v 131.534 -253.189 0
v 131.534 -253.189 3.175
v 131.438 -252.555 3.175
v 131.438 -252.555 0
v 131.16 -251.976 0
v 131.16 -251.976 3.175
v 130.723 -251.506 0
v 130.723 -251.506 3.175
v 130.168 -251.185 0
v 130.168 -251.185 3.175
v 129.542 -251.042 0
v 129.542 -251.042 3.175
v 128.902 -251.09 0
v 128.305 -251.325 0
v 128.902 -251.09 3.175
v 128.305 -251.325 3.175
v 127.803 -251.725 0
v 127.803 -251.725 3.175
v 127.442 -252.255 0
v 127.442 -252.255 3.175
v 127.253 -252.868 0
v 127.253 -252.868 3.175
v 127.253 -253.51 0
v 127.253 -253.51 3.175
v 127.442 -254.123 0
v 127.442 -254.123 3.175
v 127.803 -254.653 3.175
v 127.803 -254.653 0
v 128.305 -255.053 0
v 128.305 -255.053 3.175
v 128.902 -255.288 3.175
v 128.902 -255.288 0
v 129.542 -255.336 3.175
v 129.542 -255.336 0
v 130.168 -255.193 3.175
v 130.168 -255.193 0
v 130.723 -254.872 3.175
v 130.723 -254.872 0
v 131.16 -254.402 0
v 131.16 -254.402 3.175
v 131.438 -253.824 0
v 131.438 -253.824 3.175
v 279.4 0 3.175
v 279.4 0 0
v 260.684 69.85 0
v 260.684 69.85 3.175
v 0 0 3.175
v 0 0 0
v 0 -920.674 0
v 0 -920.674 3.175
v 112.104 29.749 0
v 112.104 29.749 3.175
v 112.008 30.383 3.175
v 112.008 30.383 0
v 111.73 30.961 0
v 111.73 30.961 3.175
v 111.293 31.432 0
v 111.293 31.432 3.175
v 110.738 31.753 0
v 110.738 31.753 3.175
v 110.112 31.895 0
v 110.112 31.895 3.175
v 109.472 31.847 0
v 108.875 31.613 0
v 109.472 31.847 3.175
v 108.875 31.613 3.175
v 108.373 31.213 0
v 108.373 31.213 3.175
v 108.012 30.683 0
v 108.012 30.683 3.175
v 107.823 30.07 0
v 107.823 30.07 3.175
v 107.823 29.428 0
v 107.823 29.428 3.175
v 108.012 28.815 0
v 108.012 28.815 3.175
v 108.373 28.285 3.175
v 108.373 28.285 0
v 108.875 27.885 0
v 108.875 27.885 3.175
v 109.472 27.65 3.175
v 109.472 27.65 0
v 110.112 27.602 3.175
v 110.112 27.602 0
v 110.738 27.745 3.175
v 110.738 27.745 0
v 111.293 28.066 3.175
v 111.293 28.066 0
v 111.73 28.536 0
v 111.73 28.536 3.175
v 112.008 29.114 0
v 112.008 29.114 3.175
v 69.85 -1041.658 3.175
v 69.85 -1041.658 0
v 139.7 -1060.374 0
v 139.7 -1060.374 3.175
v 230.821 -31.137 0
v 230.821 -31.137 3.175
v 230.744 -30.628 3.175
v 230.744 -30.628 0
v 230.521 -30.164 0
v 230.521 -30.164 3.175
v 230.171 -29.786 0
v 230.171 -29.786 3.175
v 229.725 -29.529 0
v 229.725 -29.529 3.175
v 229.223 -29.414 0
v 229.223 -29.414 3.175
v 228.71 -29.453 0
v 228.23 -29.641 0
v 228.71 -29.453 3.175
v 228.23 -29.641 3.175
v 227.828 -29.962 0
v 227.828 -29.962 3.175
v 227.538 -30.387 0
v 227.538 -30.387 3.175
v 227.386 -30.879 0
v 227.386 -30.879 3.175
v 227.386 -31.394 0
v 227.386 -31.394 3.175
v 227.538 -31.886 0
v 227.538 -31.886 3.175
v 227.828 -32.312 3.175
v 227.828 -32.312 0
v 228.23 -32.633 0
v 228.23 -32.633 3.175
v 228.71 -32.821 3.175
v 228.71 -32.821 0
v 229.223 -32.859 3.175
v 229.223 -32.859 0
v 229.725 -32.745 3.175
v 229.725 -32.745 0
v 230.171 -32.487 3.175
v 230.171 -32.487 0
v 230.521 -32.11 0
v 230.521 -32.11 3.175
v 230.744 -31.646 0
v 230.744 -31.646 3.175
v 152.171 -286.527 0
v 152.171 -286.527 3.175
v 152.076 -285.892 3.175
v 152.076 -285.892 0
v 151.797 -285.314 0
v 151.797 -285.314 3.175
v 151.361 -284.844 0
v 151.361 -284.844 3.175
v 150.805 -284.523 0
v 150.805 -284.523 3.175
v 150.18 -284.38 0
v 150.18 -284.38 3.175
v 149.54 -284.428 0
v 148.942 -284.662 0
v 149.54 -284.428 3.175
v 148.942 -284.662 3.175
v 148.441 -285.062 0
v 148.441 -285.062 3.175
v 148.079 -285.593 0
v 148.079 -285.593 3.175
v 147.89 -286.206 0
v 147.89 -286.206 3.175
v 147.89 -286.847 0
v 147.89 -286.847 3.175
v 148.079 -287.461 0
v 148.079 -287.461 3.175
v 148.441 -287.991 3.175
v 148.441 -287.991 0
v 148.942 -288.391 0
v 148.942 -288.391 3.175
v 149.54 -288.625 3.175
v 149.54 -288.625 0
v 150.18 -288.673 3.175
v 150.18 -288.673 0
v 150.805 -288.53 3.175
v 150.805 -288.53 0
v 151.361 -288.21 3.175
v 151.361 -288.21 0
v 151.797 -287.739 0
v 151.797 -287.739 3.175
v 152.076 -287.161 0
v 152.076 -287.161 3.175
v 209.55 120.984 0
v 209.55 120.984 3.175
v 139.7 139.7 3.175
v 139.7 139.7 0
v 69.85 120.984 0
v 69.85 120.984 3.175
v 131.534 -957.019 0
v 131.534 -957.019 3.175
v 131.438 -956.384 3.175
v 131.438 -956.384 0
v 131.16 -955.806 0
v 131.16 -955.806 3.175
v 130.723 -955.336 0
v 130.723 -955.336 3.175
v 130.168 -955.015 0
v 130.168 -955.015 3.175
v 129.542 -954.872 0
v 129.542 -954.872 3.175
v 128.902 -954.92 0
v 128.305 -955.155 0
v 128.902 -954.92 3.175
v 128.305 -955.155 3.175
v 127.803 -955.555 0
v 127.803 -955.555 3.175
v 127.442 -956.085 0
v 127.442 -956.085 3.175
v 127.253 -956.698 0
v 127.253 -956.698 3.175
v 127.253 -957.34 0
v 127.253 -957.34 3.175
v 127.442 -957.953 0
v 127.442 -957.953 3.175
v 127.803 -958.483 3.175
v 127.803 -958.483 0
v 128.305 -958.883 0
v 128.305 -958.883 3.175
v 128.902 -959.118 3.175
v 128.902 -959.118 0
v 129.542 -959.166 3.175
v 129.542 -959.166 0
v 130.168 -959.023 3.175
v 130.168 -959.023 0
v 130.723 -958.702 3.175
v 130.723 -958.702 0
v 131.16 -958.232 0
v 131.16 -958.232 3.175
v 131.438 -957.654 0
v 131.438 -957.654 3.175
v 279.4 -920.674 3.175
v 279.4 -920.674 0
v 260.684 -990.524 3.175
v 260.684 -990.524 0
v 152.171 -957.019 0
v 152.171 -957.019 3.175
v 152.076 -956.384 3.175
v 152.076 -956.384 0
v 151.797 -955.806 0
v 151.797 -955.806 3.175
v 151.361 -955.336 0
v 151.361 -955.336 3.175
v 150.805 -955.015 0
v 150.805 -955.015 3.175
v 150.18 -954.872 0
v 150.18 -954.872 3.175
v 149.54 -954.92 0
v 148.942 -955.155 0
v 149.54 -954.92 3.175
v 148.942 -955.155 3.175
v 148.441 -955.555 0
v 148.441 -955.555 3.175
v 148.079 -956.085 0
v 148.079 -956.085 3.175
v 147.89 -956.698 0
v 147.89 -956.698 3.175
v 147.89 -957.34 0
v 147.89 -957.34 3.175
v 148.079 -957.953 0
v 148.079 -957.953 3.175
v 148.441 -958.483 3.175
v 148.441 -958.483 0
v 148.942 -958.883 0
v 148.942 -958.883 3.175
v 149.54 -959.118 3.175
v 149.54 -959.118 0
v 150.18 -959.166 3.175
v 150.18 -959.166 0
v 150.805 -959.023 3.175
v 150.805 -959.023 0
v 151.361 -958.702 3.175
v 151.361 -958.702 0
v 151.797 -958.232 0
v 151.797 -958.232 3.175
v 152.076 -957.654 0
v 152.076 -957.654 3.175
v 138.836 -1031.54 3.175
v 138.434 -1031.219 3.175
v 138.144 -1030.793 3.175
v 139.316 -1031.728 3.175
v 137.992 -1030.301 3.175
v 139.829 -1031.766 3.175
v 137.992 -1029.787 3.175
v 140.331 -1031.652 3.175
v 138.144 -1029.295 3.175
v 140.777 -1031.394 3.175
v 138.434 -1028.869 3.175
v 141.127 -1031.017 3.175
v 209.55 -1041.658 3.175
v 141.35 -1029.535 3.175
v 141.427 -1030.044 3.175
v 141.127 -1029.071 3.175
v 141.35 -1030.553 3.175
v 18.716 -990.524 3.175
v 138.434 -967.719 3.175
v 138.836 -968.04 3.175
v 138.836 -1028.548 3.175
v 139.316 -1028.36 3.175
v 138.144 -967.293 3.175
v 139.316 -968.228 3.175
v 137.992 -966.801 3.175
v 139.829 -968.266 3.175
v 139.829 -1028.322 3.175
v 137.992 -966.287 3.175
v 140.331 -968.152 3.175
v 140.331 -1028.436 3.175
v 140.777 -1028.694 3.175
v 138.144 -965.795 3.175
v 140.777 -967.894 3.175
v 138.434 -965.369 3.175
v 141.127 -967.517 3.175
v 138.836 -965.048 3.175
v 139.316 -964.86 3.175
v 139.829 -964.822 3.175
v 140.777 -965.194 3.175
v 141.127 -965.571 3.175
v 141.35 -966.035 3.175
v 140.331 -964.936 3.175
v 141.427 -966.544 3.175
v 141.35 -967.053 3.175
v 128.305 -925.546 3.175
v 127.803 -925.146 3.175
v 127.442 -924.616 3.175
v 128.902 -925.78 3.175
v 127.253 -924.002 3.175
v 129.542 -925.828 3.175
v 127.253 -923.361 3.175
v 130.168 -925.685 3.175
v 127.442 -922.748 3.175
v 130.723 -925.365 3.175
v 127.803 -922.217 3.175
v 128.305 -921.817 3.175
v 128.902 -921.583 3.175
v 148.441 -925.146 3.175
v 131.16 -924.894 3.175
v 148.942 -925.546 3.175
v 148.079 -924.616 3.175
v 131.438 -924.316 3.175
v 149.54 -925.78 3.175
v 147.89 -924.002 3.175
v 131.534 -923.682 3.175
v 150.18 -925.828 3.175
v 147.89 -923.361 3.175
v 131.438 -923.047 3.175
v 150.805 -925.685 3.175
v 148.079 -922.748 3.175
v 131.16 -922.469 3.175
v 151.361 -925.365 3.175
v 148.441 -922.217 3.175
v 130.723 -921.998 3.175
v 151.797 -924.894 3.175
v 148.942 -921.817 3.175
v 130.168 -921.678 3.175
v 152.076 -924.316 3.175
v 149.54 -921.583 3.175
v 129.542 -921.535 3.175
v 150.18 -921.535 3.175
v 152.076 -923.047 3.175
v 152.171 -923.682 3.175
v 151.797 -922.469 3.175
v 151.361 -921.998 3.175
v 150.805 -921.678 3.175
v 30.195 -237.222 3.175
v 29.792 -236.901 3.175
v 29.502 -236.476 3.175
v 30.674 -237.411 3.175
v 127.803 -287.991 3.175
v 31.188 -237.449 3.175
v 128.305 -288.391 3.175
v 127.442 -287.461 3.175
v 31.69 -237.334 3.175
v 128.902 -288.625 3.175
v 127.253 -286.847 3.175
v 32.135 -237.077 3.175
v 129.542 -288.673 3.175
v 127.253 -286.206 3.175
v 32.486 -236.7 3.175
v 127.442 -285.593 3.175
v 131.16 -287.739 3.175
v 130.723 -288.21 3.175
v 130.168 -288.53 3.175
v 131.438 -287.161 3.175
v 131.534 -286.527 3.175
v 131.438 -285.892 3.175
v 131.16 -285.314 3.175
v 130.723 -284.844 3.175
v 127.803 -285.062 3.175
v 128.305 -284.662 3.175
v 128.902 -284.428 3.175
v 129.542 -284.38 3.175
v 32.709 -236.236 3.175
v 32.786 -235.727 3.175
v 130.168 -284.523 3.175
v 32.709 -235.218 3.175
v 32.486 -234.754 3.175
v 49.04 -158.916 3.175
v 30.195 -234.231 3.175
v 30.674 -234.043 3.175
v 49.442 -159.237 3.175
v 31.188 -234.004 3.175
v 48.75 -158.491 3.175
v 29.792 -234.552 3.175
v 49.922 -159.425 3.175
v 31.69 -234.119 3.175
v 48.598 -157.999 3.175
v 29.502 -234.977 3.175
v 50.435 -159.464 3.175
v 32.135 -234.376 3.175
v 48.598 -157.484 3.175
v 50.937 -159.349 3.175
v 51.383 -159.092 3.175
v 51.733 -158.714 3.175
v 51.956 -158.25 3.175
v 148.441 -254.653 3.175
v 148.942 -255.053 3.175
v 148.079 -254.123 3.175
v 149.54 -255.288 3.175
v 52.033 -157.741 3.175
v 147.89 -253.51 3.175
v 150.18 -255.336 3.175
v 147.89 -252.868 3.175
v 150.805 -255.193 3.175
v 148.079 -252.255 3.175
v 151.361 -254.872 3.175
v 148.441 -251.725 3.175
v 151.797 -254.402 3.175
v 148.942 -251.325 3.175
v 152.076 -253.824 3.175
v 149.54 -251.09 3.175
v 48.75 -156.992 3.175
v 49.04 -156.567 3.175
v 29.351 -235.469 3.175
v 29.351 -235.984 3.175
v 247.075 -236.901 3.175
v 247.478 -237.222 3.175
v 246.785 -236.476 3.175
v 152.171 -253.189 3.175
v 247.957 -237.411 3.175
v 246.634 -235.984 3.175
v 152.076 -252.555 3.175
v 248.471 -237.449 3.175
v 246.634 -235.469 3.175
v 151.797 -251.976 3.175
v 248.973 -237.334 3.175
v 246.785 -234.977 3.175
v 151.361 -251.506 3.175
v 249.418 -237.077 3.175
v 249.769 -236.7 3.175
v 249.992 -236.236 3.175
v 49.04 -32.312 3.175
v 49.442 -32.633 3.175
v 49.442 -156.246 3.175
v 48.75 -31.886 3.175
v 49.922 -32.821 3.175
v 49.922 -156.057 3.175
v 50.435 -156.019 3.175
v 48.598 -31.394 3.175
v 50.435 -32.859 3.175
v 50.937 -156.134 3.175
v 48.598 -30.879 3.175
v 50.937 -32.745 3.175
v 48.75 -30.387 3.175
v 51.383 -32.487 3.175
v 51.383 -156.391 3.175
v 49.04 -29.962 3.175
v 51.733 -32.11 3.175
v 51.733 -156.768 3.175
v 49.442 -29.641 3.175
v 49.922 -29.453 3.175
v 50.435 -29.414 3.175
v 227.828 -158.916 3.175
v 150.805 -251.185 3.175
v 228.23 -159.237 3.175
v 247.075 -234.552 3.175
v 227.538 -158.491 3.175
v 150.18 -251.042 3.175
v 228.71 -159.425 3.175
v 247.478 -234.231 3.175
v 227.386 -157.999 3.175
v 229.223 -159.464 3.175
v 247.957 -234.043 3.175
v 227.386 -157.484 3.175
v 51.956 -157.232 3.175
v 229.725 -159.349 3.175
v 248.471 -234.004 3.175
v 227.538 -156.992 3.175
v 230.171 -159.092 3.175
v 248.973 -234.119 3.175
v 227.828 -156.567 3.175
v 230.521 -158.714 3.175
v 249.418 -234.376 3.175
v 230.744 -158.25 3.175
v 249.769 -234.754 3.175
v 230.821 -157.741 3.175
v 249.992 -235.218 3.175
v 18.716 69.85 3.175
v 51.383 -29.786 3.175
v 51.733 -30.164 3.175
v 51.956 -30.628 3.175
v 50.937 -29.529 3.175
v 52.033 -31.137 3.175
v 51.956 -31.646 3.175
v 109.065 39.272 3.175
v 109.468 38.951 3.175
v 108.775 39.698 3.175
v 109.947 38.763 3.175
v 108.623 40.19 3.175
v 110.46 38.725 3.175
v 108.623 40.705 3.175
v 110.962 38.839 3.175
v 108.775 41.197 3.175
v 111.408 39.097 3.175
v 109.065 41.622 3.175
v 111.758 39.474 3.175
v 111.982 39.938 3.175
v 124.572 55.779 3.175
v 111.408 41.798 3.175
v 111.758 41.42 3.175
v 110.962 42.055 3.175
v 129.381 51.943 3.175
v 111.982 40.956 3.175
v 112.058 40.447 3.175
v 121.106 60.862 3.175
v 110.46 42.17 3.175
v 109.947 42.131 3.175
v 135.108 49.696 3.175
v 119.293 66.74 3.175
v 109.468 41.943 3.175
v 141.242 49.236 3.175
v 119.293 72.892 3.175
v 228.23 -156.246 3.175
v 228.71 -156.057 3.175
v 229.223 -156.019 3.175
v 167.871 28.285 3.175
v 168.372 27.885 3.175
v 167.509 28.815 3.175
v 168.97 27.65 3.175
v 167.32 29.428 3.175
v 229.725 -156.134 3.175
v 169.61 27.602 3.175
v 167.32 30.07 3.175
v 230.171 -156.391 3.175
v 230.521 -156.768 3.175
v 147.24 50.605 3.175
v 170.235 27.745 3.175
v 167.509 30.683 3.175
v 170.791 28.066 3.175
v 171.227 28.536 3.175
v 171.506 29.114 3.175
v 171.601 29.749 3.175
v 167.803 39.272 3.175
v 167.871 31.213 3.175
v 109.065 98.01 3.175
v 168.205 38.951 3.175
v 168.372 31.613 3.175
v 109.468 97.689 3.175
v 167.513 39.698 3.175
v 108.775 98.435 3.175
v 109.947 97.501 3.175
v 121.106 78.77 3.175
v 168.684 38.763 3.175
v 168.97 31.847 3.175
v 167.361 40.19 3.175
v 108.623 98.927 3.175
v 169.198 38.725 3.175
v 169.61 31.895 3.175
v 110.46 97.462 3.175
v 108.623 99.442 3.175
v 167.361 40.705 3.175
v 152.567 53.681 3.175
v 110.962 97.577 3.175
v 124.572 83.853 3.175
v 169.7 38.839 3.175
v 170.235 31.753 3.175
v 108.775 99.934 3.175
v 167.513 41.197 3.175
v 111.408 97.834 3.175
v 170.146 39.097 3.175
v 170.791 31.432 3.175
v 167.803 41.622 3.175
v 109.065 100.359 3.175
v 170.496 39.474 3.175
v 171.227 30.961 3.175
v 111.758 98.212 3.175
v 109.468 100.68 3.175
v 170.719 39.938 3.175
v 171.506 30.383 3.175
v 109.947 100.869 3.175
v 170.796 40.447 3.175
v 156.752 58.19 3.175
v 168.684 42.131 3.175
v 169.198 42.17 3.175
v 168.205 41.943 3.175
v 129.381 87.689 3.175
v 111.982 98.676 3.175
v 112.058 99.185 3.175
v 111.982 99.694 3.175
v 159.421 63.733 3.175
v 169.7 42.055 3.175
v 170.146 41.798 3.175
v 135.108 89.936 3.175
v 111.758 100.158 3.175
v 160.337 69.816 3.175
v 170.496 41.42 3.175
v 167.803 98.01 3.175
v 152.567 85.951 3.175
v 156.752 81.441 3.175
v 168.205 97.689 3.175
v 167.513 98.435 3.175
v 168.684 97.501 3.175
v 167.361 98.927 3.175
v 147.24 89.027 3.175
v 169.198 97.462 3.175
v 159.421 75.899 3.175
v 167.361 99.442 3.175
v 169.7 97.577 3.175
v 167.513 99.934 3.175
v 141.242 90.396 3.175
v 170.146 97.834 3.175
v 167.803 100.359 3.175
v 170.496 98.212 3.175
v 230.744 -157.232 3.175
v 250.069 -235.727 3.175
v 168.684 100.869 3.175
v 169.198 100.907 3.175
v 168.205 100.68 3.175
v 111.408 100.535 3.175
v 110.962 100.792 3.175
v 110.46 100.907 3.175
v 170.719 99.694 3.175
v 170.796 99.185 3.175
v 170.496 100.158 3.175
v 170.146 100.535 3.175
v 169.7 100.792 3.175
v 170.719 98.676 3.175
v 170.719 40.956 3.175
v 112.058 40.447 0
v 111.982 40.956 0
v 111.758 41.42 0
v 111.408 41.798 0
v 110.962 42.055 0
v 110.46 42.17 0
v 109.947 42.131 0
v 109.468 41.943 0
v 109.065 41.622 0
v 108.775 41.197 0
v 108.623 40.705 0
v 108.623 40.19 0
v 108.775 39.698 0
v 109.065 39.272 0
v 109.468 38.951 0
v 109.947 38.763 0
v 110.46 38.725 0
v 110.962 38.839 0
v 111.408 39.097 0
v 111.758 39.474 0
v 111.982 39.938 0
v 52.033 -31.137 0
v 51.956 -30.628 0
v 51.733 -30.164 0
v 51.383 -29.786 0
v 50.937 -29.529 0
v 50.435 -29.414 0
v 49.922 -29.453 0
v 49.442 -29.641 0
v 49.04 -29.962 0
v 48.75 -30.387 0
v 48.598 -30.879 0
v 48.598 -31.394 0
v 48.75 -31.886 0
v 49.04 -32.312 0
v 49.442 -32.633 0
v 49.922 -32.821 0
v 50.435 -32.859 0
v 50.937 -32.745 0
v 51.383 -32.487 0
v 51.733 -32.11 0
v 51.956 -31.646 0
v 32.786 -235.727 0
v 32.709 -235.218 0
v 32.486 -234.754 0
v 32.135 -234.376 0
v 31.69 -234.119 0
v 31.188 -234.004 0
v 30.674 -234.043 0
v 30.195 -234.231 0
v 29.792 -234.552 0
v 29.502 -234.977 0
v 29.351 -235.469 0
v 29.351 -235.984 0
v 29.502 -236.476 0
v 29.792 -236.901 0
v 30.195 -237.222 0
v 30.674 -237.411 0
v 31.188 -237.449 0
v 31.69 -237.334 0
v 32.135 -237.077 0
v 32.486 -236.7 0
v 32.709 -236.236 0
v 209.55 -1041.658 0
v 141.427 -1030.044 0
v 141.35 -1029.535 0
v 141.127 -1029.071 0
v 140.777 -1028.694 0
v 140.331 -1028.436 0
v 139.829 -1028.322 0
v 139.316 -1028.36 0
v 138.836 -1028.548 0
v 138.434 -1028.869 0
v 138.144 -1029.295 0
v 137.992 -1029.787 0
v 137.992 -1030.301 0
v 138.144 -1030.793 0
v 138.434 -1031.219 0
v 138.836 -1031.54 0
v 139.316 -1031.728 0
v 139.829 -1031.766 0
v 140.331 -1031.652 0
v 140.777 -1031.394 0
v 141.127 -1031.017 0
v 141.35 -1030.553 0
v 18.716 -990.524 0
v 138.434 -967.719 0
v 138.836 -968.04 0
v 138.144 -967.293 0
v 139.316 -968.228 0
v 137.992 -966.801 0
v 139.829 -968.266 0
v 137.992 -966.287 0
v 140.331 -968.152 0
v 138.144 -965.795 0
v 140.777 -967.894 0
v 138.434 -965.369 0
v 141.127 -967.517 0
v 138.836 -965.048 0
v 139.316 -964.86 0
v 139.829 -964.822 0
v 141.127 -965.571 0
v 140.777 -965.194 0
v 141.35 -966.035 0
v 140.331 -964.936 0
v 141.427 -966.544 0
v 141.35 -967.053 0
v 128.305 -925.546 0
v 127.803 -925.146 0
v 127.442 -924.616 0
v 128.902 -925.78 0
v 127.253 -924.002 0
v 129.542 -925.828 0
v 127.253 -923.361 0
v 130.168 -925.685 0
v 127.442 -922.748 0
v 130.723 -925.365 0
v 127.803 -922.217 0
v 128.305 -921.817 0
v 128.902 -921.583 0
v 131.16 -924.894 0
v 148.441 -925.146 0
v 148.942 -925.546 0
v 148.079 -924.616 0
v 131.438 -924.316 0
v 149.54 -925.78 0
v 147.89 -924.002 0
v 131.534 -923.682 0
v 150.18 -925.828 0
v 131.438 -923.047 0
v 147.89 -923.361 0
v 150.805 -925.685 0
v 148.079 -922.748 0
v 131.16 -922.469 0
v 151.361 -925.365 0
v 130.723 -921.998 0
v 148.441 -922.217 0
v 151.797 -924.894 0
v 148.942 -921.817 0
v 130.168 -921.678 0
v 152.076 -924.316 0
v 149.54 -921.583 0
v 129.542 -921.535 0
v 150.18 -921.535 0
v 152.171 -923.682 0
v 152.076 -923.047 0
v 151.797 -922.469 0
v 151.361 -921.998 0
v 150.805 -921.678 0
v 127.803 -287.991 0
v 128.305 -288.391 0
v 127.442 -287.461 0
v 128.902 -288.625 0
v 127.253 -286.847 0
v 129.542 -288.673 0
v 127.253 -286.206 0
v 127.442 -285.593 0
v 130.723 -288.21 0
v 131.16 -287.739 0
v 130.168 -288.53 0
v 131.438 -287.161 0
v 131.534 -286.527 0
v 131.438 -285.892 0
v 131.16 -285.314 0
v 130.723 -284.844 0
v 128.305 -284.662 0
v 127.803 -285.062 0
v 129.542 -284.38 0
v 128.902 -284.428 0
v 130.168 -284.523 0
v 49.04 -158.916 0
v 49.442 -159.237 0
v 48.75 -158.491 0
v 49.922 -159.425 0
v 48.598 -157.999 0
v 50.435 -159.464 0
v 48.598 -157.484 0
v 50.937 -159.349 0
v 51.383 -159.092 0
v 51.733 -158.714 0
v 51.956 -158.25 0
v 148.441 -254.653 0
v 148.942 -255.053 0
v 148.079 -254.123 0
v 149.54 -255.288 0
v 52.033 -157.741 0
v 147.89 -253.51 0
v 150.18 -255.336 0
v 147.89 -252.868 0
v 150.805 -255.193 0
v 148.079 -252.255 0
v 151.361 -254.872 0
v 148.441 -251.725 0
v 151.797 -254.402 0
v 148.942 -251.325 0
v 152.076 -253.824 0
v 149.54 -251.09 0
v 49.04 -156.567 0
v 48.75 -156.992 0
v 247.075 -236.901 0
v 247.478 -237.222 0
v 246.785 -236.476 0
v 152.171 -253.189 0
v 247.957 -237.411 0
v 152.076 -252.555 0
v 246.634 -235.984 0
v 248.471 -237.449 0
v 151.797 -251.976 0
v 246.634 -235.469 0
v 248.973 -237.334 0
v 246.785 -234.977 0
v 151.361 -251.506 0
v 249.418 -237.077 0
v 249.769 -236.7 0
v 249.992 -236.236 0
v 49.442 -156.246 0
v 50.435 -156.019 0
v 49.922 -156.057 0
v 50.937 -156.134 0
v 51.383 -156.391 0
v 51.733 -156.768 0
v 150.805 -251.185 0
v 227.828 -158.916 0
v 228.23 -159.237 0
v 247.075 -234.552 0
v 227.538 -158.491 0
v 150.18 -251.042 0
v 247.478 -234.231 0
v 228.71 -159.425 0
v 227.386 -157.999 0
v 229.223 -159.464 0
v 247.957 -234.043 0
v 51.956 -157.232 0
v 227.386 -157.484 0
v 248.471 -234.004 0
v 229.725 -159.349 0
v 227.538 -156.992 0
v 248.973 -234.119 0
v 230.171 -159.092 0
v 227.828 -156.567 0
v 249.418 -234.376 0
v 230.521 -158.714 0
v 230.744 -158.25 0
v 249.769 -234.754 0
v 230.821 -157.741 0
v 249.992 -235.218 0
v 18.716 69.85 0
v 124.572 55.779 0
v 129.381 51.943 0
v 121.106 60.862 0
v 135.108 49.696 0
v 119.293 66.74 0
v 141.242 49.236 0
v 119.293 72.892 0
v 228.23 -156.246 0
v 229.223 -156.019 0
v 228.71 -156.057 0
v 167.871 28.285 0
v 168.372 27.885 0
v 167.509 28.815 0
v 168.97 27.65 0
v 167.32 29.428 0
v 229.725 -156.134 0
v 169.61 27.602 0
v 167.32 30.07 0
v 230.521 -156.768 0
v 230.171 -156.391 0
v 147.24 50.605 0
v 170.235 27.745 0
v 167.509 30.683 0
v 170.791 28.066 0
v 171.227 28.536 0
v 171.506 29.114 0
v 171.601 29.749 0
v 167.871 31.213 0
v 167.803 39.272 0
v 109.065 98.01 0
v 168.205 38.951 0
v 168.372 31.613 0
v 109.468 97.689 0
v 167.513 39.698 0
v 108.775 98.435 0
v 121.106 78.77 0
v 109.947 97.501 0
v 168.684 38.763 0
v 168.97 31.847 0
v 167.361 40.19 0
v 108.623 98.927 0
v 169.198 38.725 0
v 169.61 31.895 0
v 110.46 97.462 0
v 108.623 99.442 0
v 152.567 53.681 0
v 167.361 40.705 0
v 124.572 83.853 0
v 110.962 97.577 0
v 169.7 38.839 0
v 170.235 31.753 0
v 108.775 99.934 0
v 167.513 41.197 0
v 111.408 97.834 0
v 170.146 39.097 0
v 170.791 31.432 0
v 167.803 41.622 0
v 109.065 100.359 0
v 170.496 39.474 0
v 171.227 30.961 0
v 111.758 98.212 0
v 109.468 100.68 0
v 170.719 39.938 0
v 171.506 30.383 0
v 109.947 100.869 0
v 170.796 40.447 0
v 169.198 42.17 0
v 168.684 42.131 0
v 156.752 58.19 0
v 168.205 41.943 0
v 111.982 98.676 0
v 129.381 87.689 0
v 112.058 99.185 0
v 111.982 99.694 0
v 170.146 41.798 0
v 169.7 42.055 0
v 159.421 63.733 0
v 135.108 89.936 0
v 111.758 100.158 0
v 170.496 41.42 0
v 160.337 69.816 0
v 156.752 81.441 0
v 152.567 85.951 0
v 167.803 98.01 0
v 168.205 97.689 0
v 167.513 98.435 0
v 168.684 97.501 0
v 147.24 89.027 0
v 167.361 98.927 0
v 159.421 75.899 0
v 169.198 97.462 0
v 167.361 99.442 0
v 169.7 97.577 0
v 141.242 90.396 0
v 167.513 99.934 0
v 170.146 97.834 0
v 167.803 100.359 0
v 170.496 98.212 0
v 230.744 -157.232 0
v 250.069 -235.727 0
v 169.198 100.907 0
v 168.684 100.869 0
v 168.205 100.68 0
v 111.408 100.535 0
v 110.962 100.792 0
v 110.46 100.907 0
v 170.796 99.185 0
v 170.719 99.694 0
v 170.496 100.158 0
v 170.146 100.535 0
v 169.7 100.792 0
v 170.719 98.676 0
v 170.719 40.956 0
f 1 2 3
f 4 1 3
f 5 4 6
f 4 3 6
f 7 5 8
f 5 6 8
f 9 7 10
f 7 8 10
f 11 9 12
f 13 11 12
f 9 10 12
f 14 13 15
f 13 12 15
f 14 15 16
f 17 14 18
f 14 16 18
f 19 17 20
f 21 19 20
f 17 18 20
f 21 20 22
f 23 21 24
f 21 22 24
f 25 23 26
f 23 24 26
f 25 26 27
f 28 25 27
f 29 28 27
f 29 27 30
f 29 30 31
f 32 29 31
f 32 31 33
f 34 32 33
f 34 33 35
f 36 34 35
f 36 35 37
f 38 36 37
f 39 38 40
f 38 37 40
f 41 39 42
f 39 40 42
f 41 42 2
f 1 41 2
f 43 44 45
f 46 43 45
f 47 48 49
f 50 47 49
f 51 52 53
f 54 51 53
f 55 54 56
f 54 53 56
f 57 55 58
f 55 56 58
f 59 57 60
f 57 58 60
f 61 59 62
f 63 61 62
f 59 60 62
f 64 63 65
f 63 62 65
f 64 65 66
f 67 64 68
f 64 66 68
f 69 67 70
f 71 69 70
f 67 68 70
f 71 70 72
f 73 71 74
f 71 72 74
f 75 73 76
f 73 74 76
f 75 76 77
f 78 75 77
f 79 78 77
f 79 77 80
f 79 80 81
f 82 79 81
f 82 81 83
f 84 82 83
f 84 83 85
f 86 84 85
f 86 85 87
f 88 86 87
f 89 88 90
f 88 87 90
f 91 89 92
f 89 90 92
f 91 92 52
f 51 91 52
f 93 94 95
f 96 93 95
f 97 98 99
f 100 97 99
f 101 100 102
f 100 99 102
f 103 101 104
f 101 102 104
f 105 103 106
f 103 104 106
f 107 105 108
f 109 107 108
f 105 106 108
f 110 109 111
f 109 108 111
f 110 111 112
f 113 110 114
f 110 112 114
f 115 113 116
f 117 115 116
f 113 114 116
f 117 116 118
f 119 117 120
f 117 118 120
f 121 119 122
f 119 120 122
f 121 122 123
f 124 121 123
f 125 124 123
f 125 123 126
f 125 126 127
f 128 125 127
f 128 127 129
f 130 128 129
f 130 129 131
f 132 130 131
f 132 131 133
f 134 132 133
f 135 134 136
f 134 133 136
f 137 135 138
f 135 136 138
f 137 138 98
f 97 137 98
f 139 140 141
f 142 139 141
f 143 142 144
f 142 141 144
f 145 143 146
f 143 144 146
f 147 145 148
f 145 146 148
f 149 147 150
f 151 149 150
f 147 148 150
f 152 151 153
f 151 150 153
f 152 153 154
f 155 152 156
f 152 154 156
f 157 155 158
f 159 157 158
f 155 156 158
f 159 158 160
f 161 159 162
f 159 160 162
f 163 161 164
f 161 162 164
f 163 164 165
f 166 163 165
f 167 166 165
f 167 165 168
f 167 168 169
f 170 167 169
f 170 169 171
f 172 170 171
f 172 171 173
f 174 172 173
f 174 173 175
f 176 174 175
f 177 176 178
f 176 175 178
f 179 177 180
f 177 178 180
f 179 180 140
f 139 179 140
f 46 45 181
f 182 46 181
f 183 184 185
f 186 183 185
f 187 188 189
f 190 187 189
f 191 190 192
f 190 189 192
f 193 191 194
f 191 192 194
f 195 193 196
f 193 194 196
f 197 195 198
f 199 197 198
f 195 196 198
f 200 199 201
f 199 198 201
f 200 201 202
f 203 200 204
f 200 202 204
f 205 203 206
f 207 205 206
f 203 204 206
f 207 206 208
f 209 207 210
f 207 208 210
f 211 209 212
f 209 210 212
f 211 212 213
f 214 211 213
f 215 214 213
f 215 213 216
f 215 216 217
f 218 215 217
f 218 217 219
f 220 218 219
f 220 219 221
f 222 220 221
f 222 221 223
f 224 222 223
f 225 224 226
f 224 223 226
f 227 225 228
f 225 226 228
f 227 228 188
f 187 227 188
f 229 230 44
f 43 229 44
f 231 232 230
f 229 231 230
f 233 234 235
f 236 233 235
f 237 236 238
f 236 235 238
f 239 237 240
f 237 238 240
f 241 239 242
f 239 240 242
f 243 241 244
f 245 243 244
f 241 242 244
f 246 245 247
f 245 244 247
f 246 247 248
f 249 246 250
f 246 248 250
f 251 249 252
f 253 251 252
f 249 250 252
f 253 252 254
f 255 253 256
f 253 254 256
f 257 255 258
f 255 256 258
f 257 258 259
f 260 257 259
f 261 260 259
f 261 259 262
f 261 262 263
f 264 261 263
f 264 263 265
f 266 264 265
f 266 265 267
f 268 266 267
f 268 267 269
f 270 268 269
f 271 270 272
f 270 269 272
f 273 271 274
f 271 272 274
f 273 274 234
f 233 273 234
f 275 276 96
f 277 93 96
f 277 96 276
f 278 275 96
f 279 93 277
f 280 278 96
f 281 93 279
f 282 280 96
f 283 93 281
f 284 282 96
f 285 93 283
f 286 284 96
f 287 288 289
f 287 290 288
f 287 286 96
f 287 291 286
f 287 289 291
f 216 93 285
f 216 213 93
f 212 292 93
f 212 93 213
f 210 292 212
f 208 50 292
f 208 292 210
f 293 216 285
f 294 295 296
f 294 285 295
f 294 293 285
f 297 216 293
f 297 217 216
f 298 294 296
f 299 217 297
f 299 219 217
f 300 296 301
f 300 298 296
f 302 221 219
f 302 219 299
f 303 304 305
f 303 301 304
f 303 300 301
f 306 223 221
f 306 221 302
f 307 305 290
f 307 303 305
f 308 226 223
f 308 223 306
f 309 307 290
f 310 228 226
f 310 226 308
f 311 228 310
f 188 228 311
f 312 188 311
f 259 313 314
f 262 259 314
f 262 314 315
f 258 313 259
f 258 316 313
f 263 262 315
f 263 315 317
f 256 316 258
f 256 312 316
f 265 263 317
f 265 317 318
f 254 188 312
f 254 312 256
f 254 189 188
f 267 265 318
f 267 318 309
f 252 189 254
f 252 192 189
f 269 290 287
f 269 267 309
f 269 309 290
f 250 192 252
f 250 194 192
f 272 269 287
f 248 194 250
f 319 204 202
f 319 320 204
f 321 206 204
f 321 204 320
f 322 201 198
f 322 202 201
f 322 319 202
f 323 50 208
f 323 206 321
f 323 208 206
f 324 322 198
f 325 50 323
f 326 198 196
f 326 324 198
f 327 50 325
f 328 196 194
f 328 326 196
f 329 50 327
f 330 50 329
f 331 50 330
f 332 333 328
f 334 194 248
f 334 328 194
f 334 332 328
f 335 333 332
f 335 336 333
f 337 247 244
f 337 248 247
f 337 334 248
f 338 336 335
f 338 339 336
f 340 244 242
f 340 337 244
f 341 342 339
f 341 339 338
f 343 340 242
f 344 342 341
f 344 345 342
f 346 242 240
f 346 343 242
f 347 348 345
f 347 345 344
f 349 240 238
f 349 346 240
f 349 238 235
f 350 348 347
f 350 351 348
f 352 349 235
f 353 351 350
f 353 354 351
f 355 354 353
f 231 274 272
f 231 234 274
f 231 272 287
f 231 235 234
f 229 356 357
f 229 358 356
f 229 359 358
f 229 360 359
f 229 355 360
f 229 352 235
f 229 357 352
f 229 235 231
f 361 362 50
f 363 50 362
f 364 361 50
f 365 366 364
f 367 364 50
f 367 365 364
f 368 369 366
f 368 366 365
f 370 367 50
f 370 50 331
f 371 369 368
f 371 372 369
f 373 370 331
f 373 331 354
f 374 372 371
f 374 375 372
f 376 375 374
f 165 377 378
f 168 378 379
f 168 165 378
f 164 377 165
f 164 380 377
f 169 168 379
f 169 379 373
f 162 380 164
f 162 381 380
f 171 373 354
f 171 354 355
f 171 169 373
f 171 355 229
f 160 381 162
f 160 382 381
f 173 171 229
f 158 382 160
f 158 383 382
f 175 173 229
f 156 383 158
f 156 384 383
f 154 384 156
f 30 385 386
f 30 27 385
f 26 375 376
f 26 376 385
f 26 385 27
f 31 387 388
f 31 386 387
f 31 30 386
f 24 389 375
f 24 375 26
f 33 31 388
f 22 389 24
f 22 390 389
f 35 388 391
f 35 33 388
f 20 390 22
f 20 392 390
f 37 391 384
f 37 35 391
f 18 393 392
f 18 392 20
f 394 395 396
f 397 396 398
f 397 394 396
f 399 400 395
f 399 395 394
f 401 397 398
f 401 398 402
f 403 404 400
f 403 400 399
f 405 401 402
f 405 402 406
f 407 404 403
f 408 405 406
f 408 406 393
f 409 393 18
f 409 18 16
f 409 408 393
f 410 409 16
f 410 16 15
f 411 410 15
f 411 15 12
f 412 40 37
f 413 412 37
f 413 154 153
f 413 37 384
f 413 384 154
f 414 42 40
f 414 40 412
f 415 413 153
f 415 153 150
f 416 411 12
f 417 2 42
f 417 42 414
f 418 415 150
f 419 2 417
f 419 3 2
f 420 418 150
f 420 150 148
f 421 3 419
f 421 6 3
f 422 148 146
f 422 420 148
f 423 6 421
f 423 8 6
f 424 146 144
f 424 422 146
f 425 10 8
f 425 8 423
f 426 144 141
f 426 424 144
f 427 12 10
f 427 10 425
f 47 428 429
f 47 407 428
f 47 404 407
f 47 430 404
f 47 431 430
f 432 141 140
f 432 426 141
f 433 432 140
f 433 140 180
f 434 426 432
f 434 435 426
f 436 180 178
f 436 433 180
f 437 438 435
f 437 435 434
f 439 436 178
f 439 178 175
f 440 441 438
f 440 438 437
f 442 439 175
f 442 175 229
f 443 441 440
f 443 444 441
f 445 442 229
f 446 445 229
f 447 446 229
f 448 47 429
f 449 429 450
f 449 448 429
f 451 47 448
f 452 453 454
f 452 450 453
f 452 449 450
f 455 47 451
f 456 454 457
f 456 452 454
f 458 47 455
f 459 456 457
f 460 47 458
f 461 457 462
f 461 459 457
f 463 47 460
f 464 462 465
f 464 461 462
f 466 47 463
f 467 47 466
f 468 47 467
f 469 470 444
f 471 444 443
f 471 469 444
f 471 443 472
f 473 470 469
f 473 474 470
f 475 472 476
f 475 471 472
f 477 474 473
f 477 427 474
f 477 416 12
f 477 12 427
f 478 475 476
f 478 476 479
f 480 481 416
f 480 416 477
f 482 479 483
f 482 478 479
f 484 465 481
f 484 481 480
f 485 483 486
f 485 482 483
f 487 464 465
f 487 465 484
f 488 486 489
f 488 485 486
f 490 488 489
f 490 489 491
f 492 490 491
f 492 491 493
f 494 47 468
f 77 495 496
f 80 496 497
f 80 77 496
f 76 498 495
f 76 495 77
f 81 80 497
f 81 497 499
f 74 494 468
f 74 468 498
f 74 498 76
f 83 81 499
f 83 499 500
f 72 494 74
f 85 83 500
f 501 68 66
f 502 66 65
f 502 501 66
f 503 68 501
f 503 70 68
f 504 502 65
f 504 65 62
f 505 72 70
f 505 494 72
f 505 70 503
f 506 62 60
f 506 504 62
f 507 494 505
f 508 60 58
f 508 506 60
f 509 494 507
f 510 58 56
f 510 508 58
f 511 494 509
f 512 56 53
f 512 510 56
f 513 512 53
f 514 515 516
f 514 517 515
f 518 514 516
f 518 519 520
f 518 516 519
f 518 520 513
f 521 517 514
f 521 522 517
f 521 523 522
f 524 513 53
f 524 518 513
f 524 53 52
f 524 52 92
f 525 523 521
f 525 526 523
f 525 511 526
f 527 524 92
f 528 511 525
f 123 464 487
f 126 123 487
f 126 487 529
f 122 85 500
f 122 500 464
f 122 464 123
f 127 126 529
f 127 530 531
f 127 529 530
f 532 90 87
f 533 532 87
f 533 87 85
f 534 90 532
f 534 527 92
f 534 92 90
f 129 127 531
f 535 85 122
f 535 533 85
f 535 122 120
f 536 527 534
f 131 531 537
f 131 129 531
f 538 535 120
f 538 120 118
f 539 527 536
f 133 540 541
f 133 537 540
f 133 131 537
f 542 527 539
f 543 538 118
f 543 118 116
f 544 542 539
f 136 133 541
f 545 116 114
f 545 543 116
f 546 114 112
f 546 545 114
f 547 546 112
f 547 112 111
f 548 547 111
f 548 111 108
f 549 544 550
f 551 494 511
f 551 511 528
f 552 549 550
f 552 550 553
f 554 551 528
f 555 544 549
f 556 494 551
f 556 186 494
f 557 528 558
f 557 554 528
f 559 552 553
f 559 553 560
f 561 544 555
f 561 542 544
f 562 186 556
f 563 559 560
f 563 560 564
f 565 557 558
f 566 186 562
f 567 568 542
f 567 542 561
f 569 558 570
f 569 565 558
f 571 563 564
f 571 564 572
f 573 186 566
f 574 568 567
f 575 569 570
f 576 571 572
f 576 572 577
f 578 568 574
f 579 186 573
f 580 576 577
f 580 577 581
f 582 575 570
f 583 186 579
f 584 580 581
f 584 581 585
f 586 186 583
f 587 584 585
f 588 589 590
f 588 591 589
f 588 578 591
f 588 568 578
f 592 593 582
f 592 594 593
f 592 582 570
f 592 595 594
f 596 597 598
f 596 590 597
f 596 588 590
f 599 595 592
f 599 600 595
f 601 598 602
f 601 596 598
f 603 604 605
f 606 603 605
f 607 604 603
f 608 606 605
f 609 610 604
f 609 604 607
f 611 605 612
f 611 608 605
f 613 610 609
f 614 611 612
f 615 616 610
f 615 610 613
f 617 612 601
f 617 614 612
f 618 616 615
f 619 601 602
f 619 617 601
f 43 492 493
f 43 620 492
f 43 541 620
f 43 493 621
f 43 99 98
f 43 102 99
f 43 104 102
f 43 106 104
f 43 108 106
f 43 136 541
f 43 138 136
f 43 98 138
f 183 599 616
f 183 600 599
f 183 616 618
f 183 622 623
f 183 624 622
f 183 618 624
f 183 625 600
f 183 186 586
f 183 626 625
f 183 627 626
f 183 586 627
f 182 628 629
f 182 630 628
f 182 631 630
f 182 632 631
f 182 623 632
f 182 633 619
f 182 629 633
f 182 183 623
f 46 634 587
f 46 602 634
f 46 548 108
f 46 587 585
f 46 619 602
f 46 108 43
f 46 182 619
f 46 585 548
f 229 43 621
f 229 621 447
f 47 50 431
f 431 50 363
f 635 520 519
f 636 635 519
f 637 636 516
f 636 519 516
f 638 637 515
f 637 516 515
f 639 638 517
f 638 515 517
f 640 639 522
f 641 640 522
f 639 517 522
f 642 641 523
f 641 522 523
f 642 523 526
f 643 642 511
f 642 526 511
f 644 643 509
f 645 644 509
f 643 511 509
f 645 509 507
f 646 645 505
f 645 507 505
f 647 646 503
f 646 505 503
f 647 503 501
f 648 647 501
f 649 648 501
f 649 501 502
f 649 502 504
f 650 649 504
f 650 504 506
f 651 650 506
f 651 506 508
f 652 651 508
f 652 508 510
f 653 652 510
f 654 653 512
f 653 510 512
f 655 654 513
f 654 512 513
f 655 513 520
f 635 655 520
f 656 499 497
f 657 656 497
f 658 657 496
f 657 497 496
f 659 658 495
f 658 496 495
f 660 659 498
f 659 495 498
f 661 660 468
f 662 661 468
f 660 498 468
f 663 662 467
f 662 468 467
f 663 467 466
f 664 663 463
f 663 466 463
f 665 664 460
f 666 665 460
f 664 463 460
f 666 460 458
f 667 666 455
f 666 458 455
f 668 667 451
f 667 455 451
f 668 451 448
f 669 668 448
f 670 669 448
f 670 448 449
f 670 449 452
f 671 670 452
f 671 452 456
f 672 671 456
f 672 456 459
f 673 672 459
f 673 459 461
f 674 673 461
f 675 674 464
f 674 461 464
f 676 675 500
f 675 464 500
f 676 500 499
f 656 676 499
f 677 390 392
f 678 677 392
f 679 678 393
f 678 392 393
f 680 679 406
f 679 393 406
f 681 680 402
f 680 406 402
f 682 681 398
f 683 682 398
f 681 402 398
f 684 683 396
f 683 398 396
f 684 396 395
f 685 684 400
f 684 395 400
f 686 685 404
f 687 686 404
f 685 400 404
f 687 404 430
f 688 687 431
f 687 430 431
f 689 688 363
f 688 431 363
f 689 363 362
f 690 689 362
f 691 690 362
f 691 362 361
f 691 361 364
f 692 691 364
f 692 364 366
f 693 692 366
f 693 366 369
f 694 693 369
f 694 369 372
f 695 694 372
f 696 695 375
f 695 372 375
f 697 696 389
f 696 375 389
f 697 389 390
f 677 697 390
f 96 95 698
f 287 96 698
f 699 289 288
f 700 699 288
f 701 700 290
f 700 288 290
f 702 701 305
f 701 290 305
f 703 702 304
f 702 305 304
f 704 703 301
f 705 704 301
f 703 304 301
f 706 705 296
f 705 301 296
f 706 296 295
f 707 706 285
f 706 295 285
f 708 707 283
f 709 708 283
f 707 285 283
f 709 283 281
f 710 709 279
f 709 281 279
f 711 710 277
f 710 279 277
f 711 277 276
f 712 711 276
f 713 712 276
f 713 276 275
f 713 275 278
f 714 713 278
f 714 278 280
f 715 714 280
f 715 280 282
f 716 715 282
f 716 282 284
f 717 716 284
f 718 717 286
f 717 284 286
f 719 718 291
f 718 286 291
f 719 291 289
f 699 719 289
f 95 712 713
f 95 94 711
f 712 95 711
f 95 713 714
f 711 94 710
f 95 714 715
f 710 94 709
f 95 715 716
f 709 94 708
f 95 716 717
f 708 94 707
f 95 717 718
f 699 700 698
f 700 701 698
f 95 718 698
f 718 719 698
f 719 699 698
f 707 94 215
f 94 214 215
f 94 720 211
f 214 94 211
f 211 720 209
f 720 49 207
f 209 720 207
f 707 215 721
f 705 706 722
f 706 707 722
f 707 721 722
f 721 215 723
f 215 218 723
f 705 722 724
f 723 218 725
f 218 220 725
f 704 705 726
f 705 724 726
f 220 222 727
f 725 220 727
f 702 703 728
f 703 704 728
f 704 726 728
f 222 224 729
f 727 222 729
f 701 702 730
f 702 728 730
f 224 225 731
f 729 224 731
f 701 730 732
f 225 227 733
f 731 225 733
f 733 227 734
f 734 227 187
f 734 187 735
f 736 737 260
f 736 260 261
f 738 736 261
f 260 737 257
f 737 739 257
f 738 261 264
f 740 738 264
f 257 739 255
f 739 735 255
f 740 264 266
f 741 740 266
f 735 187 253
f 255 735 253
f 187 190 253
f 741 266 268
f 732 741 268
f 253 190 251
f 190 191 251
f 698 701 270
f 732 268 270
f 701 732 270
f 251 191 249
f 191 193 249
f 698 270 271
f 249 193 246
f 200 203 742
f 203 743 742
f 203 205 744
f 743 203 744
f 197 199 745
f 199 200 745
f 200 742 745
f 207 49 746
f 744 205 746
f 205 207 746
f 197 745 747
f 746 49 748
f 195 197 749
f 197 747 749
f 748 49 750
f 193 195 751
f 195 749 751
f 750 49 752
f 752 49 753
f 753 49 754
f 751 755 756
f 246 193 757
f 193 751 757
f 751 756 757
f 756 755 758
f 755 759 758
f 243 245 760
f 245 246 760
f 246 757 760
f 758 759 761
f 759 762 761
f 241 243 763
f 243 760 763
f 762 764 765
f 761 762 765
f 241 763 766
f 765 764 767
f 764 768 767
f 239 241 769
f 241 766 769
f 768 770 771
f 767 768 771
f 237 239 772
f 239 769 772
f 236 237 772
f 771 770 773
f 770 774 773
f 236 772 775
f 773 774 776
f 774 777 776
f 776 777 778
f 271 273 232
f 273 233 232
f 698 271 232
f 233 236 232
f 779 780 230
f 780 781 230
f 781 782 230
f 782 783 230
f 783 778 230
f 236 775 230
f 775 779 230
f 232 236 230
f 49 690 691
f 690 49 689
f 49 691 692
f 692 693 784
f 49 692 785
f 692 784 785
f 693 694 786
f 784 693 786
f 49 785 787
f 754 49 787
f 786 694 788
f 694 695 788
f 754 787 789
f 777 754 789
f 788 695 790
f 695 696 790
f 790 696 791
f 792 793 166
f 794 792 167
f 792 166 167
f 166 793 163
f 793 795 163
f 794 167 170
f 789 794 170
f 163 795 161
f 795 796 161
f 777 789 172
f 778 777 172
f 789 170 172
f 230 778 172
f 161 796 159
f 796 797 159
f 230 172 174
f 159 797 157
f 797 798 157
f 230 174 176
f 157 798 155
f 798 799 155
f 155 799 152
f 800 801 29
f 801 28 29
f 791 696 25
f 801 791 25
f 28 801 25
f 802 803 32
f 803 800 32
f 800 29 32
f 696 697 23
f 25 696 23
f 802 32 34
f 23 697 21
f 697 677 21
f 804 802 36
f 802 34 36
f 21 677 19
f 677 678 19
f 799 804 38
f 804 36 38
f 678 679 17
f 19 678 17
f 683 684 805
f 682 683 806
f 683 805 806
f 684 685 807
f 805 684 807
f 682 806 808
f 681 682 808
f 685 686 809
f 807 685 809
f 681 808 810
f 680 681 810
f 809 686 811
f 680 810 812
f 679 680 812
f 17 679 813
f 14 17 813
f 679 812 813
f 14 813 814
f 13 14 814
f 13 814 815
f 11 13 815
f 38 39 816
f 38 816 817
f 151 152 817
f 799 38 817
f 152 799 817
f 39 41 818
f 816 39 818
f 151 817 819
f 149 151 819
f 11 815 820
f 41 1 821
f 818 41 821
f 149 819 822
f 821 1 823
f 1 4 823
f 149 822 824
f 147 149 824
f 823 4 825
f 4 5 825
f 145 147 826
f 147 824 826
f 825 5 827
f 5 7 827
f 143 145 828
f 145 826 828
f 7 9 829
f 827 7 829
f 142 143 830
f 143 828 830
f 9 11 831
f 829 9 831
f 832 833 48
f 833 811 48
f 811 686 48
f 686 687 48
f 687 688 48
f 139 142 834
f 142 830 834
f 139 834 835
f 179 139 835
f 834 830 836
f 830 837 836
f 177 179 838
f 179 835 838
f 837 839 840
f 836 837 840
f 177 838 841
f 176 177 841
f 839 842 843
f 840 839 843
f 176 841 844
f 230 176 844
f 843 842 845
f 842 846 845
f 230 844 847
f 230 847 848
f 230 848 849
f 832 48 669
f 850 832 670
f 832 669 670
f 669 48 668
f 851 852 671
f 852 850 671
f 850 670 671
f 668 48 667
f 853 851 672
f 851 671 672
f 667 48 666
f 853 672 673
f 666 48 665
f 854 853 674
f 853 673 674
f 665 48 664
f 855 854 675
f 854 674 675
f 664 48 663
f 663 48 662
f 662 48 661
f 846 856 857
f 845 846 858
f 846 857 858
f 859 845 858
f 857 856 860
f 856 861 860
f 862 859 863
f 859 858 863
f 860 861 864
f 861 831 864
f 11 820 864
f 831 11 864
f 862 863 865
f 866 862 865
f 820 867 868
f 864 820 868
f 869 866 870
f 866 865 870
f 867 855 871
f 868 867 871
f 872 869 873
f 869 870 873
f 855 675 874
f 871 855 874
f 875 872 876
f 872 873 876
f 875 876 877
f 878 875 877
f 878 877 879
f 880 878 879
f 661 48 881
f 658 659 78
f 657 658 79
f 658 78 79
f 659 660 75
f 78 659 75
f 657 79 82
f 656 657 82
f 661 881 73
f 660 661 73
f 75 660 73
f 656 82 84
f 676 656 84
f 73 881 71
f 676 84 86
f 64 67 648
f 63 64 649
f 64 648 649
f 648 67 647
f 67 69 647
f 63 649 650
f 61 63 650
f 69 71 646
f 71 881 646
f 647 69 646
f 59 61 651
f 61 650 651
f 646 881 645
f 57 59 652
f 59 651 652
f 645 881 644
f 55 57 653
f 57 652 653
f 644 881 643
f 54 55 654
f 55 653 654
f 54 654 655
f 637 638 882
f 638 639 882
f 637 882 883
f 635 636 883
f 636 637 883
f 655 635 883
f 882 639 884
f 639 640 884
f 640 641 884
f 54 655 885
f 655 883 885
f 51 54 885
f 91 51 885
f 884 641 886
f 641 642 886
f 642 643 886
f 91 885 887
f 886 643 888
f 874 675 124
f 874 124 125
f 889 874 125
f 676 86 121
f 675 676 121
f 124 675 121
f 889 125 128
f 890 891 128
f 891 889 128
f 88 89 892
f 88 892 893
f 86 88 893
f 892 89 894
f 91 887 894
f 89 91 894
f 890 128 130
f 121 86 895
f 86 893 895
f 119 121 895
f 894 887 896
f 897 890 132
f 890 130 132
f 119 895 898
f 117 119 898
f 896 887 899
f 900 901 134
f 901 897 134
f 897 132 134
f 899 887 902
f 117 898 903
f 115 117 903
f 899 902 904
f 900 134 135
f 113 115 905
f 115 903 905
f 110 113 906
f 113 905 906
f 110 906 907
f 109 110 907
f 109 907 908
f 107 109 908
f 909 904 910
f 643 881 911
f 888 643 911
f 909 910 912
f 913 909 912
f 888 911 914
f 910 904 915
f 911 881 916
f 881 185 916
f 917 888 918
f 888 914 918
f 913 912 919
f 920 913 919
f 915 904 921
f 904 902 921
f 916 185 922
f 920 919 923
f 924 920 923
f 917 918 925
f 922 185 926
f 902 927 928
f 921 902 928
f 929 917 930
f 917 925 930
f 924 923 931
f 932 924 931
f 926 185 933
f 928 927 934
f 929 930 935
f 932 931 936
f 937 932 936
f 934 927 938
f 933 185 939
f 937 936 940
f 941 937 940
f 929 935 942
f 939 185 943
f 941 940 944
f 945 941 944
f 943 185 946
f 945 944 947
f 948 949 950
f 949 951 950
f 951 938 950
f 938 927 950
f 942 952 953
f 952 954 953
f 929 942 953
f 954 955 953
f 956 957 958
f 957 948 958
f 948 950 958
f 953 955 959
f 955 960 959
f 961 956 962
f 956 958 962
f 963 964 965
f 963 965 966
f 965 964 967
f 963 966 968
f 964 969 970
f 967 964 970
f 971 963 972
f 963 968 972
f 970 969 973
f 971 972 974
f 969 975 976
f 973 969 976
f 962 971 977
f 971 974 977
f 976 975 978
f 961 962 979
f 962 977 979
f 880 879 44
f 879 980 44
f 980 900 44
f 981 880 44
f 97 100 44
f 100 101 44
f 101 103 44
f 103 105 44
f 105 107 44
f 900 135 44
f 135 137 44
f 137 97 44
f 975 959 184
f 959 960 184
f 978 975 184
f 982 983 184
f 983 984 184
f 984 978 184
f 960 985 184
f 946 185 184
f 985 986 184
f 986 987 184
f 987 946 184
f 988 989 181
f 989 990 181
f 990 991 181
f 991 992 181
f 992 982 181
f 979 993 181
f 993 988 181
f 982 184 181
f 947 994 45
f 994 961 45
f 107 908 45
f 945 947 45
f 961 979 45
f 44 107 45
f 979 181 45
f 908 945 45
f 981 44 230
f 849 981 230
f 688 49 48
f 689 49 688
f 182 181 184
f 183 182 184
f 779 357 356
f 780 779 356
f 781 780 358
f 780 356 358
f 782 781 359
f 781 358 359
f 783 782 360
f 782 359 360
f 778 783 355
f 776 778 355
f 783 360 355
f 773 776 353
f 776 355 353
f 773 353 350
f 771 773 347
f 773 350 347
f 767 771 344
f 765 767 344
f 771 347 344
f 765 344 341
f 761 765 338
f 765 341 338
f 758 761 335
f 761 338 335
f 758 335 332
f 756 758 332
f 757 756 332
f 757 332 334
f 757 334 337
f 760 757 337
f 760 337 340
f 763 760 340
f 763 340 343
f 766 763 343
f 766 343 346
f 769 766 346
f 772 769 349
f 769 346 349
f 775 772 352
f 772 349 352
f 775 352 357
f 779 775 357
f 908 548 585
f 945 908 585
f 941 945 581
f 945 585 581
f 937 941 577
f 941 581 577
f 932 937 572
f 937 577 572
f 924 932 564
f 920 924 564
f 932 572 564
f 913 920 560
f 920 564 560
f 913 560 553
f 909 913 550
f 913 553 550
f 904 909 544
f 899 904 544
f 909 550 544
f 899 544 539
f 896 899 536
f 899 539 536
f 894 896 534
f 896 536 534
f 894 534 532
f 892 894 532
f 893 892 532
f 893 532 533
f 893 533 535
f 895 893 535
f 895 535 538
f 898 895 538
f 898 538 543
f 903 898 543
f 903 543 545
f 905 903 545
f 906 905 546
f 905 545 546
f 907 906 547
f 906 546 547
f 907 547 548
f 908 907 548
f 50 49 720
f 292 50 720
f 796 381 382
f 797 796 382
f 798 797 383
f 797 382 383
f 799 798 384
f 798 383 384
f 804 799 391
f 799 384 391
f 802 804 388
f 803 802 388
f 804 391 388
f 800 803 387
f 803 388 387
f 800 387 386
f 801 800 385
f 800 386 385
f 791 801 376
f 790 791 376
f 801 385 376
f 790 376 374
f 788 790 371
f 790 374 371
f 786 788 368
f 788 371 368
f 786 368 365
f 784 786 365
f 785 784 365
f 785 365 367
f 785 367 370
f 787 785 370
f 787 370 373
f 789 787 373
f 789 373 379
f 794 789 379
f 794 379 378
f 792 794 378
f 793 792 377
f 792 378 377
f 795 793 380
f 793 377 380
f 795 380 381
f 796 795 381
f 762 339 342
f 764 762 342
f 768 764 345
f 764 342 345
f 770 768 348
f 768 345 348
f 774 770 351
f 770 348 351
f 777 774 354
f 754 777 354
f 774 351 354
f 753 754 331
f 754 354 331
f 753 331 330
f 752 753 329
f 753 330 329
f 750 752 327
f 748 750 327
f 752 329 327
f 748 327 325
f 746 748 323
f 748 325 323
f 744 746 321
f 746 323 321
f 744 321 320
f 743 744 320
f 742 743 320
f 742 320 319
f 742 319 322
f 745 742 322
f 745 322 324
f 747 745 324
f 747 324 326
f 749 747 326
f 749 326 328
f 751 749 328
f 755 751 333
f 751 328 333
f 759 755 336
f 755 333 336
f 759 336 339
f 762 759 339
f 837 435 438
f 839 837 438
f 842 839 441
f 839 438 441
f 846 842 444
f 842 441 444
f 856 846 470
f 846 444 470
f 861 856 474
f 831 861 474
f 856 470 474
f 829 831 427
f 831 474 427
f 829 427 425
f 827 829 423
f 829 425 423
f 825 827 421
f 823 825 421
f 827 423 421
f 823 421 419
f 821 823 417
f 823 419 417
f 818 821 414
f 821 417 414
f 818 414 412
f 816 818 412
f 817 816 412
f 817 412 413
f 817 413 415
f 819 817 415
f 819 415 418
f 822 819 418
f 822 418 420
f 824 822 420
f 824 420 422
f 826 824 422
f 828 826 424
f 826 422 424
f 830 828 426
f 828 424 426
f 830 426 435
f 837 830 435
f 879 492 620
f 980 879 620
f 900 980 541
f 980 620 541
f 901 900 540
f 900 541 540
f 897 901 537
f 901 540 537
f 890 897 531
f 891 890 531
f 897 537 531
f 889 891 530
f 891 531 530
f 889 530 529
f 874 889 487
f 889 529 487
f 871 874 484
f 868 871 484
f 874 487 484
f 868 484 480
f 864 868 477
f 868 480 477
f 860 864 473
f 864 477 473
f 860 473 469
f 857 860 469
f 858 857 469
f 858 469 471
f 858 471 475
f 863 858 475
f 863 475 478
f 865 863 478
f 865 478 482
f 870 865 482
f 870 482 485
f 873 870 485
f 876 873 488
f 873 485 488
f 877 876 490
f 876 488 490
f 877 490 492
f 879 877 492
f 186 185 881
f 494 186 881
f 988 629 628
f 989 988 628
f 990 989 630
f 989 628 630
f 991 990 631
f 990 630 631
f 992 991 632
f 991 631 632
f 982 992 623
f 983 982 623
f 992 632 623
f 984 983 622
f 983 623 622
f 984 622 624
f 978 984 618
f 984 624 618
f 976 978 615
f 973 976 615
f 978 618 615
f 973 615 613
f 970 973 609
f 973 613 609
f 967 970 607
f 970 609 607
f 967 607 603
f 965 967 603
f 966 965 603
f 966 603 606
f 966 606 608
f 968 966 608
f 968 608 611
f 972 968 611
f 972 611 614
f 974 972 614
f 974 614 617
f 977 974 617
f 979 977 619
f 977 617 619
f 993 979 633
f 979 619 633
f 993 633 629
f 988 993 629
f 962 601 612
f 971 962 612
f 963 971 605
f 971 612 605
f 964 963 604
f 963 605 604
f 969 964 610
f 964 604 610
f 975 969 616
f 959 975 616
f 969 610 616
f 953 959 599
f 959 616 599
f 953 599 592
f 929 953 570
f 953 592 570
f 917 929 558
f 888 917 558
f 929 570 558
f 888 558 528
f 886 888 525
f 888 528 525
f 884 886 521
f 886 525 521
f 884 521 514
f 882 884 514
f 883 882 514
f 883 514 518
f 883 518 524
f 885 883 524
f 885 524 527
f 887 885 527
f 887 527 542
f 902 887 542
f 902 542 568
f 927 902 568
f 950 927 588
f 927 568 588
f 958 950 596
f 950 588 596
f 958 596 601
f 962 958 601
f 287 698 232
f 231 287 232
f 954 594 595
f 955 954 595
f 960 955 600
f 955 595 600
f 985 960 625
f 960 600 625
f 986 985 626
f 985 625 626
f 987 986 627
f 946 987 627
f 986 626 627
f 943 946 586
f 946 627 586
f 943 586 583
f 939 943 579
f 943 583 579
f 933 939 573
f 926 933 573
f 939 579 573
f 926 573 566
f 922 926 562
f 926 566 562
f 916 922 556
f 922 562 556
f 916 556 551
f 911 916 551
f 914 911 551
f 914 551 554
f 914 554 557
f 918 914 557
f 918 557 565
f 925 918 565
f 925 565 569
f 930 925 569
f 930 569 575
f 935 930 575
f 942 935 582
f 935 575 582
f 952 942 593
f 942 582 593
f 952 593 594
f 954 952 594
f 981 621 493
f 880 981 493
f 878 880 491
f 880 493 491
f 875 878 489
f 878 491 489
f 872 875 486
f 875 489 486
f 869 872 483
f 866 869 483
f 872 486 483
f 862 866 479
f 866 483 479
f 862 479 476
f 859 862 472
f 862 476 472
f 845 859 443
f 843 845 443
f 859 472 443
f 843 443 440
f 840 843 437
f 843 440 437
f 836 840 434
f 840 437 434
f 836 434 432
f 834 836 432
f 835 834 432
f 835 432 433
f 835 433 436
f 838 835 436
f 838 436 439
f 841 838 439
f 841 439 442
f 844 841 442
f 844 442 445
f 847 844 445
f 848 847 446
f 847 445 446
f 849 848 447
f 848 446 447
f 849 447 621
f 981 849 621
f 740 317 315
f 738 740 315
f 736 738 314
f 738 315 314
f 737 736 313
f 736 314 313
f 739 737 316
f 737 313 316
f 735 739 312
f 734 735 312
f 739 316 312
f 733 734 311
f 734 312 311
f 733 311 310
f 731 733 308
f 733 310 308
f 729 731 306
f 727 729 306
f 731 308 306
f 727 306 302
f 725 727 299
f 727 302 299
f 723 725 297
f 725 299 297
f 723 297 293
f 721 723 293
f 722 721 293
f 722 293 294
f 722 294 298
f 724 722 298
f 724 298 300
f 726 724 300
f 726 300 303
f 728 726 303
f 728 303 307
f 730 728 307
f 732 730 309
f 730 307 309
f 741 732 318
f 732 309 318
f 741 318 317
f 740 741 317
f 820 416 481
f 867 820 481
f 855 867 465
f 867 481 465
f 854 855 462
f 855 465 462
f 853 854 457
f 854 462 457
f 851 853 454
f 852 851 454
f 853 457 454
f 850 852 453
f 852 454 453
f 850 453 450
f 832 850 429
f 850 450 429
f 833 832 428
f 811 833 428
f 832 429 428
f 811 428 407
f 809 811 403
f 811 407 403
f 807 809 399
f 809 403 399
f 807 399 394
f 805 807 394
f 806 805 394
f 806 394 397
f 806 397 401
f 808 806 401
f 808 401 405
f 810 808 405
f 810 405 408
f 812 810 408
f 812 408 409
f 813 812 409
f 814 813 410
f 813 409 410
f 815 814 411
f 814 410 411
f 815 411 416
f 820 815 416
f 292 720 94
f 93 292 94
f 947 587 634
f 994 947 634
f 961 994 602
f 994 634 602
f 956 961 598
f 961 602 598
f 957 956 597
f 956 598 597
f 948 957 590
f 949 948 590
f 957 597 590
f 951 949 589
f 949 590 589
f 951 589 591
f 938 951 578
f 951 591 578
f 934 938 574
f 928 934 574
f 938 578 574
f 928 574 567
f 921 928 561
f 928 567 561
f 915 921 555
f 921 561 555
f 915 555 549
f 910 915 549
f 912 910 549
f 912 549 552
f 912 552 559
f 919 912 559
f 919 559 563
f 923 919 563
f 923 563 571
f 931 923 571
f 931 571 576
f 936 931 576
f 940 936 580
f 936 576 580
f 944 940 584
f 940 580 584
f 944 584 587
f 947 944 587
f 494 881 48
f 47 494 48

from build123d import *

# Parameters (mm, degrees)
F1_DEPTH = 3.175
F2_R     = 20.6375
F2_R_2   = 1.7272
F2_R_3   = 2.15265
F3_DEPTH = 3.175
F4_R     = 2.15265
F5_DEPTH = 3.175


with BuildPart() as f1:
    # F0 (on Top) → F1 (new body)
    with BuildSketch(Plane.XY):
        Polygon((279.4, -920.674486), (279.4, 0), (260.683749, 69.85), (209.55, 120.983749), (139.7, 139.7), (69.85, 120.983749), (18.716251, 69.85), (0, 0), (0, -920.674486), (18.716251, -990.524486), (69.85, -1041.658235), (139.7, -1060.374486), (209.55, -1041.658235), (260.683749, -990.524486), align=None)
    extrude(amount=F1_DEPTH)

    # F2 (on face) → F3 (cut, through all)
    with BuildSketch(Plane.XY.offset(3.175)):
        with Locations((139.7, 69.815902)):
            Circle(F2_R)
        with Locations((229.093993, -31.136842)):
            Circle(F2_R_2)
        with Locations((229.093993, -157.74139)):
            Circle(F2_R_2)
        with Locations((110.33125, 40.447152)):
            Circle(F2_R_2)
        with Locations((169.06875, 40.447152)):
            Circle(F2_R_2)
        with Locations((169.06875, 99.184652)):
            Circle(F2_R_2)
        with Locations((110.33125, 99.184652)):
            Circle(F2_R_2)
        with Locations((50.306007, -157.74139)):
            Circle(F2_R_2)
        with Locations((50.306007, -31.136842)):
            Circle(F2_R_2)
        with Locations((248.34149, -235.726616)):
            Circle(F2_R_2)
        with Locations((31.05851, -235.726616)):
            Circle(F2_R_2)
        with Locations((150.01875, -286.526616)):
            Circle(F2_R_3)
        with Locations((129.38125, -286.526616)):
            Circle(F2_R_3)
        with Locations((129.38125, -253.189116)):
            Circle(F2_R_3)
        with Locations((150.01875, -253.189116)):
            Circle(F2_R_3)
        with Locations((129.38125, -923.681501)):
            Circle(F2_R_3)
        with Locations((150.01875, -923.681501)):
            Circle(F2_R_3)
        with Locations((150.01875, -957.019001)):
            Circle(F2_R_3)
        with Locations((129.38125, -957.019001)):
            Circle(F2_R_3)
        with Locations((139.7, -966.544001)):
            Circle(F2_R_2)
        with Locations((139.7, -1030.044001)):
            Circle(F2_R_2)
    extrude(amount=-F3_DEPTH, mode=Mode.SUBTRACT)

    # F4 (on face) → F5 (cut, through all)
    with BuildSketch(Plane.XY.offset(3.175)):
        with Locations((109.951253, 29.748759)):
            Circle(F4_R)
        with Locations((169.448747, 29.748759)):
            Circle(F4_R)
    extrude(amount=-F5_DEPTH, mode=Mode.SUBTRACT)


solid = f1.part
